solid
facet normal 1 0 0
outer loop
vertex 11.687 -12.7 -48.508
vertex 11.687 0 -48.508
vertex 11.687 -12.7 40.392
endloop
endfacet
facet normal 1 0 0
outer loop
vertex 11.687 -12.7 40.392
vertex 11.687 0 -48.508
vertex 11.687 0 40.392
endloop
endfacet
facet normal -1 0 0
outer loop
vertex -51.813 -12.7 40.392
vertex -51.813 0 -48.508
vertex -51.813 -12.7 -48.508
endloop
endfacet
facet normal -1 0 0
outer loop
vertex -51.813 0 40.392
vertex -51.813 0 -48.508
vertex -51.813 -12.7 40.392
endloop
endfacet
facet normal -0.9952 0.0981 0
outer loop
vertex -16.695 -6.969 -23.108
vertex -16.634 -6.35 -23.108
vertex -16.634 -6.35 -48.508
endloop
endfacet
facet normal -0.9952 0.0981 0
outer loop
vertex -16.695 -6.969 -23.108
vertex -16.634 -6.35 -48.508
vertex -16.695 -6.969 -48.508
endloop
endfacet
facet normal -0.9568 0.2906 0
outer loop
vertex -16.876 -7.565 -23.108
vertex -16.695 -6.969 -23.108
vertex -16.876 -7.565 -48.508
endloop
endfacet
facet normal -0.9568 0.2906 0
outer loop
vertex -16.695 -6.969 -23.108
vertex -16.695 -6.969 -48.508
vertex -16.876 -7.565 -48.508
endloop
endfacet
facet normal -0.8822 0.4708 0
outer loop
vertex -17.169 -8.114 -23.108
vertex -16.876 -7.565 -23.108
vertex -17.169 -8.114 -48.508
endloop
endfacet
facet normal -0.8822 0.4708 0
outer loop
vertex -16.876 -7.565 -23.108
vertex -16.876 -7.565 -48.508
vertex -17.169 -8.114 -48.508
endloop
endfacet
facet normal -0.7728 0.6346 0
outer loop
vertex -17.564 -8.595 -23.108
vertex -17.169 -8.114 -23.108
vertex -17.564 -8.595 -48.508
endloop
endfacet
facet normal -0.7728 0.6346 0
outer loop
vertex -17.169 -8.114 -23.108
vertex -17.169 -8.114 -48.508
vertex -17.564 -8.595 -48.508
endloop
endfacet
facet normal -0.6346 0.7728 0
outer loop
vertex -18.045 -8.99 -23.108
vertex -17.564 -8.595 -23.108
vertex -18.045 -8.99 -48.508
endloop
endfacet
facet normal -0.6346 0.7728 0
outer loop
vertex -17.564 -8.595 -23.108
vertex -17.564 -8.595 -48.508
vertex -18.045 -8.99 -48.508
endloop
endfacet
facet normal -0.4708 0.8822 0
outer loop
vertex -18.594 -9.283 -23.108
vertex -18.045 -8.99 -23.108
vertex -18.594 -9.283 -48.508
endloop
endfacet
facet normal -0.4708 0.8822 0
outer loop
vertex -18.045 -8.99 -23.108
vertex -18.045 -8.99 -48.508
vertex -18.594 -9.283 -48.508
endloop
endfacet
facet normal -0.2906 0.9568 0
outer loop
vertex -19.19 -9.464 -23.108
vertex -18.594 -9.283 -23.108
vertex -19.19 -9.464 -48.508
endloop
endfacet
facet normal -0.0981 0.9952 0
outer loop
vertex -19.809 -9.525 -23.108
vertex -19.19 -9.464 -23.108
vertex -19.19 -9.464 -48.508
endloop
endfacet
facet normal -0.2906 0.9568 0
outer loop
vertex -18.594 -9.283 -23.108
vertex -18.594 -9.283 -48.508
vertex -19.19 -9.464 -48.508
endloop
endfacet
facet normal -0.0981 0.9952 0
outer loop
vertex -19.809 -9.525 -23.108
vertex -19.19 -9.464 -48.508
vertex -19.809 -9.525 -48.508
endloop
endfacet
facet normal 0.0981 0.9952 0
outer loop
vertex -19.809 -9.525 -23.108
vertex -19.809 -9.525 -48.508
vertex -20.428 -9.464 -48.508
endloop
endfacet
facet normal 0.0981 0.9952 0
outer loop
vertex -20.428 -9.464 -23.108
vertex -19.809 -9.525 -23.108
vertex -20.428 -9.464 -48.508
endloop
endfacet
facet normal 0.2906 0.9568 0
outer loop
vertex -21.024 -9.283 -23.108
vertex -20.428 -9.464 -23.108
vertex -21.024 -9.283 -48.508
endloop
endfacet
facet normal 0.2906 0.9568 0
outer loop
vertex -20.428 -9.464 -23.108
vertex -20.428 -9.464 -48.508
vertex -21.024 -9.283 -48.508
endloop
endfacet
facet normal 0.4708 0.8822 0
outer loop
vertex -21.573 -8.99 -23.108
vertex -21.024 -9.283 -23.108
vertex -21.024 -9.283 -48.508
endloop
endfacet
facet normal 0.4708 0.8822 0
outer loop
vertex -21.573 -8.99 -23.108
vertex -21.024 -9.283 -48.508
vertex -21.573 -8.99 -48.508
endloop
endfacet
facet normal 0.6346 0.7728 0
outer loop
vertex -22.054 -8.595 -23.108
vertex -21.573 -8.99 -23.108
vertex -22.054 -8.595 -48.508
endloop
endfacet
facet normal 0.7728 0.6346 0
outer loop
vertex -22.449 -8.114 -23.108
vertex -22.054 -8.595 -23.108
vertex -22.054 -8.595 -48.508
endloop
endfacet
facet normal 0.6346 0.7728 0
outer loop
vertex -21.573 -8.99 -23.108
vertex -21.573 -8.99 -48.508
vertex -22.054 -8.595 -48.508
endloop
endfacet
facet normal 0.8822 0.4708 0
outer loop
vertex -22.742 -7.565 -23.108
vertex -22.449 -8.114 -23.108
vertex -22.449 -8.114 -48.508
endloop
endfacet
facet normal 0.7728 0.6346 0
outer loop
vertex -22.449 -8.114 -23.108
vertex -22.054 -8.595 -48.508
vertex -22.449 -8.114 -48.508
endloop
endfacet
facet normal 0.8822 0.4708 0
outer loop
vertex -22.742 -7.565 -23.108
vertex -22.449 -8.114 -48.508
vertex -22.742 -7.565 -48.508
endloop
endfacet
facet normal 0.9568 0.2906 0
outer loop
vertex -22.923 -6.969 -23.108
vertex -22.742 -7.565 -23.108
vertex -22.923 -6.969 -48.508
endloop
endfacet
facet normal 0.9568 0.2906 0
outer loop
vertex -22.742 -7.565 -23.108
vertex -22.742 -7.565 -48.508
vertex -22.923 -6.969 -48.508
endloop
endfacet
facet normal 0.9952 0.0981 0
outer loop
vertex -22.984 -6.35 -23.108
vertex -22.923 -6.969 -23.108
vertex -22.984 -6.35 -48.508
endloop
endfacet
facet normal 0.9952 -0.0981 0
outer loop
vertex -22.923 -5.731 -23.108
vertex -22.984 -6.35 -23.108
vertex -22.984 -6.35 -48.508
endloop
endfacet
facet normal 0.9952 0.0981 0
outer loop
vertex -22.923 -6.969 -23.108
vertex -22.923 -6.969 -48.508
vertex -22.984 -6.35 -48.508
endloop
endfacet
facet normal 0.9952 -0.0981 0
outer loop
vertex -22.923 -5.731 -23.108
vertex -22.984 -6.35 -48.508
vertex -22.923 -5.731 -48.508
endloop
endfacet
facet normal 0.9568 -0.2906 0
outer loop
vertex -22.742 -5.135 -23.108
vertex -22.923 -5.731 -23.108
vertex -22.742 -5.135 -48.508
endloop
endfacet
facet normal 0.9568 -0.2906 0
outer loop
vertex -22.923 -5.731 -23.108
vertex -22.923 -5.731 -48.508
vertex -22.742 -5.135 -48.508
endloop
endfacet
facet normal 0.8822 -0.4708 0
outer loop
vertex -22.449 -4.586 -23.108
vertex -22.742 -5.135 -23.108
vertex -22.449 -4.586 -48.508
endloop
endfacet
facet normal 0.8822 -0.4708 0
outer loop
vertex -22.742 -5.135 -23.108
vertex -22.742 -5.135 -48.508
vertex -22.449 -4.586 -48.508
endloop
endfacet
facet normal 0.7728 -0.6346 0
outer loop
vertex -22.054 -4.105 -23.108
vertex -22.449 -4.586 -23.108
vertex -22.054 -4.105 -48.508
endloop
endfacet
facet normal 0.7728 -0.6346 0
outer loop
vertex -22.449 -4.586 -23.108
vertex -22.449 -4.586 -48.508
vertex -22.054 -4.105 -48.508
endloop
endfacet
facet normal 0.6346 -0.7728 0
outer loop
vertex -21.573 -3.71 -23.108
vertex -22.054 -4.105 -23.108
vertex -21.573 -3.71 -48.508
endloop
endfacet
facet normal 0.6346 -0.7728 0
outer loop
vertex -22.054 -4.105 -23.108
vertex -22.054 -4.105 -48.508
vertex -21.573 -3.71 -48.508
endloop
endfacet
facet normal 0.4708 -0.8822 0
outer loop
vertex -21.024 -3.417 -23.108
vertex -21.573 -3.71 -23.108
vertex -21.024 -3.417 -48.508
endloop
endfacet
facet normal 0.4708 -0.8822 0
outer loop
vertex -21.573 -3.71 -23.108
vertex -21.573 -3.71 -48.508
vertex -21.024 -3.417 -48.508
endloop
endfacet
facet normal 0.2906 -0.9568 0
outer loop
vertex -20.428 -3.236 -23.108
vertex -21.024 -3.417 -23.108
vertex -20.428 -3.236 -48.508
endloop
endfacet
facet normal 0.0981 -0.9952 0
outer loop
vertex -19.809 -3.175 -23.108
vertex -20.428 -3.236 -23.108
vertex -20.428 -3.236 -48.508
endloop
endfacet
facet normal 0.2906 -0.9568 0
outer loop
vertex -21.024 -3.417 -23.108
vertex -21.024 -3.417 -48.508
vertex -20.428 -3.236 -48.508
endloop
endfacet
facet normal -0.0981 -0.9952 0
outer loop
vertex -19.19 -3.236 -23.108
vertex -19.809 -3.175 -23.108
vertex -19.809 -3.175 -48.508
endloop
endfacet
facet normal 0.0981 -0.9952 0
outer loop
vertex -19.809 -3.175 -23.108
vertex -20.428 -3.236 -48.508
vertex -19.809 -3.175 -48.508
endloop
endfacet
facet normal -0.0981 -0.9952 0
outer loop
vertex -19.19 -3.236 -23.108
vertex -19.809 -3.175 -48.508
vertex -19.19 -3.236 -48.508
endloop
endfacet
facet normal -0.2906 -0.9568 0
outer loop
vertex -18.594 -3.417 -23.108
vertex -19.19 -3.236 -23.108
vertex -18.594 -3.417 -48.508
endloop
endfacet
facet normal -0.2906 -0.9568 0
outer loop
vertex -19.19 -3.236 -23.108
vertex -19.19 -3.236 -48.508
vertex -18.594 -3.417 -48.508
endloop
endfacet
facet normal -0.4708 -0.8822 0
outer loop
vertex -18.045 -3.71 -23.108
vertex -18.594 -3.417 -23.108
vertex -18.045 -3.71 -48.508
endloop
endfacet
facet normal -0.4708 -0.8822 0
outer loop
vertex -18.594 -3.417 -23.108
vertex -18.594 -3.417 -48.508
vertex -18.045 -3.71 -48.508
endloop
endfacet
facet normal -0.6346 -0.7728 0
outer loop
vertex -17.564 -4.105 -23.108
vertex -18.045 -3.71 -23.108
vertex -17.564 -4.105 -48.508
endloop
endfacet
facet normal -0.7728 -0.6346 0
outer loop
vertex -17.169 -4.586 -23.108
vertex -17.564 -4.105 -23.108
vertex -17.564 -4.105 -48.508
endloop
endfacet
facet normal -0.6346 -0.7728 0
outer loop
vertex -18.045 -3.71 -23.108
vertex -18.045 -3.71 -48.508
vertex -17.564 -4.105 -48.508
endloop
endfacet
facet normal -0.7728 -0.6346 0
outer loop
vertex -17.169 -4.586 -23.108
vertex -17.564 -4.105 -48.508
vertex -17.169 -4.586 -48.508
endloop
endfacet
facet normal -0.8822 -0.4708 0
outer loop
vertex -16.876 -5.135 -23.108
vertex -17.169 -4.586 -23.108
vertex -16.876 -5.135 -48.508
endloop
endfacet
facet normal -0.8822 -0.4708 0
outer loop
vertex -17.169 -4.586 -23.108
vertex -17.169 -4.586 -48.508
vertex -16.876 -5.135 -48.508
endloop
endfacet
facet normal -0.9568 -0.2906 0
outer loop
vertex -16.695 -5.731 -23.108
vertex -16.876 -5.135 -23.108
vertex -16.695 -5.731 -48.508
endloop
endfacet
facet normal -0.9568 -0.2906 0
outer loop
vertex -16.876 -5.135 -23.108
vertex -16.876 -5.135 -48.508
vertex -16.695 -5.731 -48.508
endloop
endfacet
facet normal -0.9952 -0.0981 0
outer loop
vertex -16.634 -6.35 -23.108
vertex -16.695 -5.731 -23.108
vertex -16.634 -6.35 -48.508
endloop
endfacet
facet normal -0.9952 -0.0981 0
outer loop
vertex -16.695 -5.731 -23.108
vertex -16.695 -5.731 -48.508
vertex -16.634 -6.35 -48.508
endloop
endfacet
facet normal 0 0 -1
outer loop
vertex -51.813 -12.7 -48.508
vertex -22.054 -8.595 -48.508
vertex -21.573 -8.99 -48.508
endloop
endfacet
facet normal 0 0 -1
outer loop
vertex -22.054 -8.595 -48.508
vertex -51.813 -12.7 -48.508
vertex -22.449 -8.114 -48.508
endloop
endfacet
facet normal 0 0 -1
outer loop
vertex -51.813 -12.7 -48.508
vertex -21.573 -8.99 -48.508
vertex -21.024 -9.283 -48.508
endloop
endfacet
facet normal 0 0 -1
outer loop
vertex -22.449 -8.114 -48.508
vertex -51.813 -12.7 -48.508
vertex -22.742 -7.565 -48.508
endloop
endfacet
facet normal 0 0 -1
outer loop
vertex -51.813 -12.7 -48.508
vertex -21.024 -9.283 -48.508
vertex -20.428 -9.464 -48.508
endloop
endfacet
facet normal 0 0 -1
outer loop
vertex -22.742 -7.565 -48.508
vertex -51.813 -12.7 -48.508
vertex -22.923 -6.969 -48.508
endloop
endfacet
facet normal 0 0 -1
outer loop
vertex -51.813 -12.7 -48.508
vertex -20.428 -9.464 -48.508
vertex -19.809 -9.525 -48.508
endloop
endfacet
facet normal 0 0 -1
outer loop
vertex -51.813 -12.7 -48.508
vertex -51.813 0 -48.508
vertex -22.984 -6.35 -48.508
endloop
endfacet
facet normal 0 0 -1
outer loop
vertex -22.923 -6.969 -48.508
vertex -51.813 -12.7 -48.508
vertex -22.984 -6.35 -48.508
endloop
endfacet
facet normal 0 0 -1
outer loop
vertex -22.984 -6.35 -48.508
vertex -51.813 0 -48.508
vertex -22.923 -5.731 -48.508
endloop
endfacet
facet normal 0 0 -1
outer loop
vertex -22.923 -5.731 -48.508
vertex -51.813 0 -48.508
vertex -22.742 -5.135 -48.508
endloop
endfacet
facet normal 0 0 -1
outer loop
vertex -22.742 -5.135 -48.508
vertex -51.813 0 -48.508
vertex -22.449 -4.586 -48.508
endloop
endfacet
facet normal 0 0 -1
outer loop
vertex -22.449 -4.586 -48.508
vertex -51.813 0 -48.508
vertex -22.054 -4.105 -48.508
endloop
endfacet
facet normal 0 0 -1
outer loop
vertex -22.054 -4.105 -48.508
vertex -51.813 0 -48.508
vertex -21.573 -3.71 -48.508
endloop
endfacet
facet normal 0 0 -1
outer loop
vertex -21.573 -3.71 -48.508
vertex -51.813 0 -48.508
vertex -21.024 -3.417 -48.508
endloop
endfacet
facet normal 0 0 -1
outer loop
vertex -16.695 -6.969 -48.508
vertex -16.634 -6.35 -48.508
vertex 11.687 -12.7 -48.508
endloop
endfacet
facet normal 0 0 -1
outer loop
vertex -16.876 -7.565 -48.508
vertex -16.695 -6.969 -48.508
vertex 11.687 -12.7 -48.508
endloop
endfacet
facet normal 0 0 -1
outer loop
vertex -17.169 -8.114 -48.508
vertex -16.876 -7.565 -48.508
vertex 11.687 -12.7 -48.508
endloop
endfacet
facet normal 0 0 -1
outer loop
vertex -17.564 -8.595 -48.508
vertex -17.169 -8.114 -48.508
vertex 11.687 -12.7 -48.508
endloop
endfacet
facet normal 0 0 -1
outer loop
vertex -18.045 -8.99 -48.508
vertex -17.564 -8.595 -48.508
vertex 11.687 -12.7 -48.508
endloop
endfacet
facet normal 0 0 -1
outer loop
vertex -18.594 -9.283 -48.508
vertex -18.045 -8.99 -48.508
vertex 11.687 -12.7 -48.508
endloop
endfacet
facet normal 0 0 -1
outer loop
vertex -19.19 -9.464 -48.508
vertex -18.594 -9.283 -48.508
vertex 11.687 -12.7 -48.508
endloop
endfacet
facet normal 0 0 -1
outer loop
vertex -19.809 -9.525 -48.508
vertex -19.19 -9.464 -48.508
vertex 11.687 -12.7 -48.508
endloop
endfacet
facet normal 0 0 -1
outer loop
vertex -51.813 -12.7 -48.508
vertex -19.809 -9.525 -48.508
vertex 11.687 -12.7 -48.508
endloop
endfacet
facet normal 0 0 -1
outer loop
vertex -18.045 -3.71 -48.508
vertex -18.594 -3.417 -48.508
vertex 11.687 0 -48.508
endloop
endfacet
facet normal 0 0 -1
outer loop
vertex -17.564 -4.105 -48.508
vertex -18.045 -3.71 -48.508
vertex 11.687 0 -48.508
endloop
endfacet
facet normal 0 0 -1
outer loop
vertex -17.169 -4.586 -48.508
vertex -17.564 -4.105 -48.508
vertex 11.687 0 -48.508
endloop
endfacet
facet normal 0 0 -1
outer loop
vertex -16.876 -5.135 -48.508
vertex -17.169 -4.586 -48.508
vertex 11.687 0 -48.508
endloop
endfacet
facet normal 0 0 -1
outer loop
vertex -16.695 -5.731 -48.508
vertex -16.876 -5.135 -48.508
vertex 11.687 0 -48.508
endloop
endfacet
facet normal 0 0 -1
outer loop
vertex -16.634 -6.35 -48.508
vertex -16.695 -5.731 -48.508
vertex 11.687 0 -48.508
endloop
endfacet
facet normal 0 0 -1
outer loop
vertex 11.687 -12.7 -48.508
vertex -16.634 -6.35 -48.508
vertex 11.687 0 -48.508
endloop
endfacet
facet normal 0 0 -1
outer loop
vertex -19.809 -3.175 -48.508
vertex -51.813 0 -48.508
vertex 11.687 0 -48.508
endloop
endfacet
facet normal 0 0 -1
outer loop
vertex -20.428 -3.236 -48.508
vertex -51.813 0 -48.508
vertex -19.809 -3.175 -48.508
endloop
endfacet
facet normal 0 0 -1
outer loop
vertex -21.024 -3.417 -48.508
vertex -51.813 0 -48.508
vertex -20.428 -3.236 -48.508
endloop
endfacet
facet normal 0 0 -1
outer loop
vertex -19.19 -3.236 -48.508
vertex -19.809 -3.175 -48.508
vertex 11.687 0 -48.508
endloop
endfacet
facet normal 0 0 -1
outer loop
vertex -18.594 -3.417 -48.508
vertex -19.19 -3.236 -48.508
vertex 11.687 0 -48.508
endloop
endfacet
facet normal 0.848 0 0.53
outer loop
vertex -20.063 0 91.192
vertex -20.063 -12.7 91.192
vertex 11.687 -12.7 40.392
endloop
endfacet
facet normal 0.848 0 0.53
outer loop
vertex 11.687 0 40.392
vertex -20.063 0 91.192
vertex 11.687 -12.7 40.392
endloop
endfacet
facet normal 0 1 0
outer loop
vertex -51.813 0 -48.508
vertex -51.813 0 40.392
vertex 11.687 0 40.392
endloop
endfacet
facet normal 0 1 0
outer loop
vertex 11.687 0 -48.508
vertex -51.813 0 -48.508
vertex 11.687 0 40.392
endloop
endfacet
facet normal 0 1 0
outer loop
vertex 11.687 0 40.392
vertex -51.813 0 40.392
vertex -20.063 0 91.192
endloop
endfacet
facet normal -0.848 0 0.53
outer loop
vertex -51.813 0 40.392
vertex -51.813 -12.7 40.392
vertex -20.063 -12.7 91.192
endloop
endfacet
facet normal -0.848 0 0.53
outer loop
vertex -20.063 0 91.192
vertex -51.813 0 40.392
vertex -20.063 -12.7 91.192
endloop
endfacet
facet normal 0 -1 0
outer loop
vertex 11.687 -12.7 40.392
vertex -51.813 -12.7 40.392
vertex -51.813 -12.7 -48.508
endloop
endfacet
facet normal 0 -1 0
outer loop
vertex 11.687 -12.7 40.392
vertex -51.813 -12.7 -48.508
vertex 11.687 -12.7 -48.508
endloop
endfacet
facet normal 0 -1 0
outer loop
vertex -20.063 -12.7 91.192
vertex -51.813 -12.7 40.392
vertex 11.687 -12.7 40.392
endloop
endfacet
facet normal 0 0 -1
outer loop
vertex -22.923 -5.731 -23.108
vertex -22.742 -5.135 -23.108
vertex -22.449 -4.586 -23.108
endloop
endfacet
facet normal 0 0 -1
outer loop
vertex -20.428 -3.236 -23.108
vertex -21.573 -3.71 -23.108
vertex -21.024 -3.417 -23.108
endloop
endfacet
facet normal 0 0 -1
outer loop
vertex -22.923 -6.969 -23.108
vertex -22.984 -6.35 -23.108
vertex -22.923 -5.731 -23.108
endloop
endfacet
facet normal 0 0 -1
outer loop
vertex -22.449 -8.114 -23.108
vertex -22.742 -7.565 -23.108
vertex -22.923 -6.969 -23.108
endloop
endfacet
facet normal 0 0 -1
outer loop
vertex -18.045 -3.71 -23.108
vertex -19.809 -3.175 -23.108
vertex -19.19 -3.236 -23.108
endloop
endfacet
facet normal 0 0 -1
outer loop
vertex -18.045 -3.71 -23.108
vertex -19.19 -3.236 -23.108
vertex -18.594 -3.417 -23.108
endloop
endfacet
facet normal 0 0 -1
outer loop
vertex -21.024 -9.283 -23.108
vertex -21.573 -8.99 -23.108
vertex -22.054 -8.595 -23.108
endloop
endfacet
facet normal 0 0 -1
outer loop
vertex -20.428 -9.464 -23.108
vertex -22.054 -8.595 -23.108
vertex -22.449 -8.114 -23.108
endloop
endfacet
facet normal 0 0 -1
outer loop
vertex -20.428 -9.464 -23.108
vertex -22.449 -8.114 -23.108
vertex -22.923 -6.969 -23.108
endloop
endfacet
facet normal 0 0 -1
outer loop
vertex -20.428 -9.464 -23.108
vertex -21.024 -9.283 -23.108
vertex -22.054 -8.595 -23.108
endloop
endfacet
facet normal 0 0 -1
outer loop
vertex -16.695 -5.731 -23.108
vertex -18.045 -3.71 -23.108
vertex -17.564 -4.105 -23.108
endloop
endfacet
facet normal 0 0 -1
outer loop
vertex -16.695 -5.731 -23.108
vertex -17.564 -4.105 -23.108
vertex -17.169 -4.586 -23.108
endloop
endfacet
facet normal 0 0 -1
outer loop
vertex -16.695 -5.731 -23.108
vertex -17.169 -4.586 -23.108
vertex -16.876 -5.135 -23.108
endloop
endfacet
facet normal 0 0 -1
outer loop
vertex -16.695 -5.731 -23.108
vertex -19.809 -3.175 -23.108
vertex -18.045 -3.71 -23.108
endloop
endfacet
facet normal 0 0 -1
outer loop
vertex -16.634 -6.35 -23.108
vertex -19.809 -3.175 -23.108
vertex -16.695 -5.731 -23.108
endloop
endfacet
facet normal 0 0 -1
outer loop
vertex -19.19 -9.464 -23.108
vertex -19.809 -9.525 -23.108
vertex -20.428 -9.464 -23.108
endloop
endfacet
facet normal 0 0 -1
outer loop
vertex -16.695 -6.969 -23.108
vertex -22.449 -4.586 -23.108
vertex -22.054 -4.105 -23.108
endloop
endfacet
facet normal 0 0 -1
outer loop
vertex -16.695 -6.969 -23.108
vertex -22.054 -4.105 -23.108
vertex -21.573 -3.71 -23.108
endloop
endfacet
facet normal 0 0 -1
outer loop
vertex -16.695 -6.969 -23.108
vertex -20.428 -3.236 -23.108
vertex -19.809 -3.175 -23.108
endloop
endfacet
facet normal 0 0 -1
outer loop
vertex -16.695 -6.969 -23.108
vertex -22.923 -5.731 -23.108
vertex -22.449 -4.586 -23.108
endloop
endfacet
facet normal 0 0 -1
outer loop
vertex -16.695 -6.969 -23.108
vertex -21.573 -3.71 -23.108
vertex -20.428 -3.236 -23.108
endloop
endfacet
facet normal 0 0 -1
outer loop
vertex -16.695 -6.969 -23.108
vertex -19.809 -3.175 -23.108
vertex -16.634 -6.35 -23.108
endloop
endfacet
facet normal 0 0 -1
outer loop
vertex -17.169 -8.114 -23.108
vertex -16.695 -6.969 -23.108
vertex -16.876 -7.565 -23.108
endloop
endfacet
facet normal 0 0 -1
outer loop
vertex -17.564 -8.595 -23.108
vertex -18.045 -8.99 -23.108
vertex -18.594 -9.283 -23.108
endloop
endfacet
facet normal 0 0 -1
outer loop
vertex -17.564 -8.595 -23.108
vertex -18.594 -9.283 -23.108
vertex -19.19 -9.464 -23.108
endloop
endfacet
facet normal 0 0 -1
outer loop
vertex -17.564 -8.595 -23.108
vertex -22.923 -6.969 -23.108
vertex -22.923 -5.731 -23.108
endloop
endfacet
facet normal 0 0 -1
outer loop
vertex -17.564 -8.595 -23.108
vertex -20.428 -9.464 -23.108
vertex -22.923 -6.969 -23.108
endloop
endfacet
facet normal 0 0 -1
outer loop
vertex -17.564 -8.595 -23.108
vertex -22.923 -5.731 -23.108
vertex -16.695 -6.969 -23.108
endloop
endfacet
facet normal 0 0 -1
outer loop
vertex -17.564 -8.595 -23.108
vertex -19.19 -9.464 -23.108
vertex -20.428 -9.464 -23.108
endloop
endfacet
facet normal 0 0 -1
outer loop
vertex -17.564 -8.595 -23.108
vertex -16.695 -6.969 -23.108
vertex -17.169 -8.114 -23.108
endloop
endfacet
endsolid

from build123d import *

# Parameters (mm, degrees)
F0_W     = 63.5
F0_H     = 139.7
F1_DEPTH = 12.7
F3_DEPTH = 25.4
F4_R     = 3.175
F5_DEPTH = 25.4


with BuildPart() as f1:
    # F0 (on Front) → F1 (new body)
    with BuildSketch(Plane.XZ):
        with Locations((-20.063438, 21.341896)):
            Rectangle(F0_W, F0_H)
    extrude(amount=F1_DEPTH)

    # F2 (on face) → F3 (cut)
    with BuildSketch(Plane.XZ.offset(12.7)):
        Polygon((-51.813438, 40.391896), (-20.063438, 91.191896), (-51.813438, 91.191896), align=None)
        Polygon((11.686562, 91.191896), (-20.063438, 91.191896), (11.686562, 40.391896), align=None)
    extrude(amount=-F3_DEPTH, mode=Mode.SUBTRACT)

    # F4 (on face) → F5 (cut)
    with BuildSketch(Plane(origin=(0, 0, -48.508104), x_dir=(1, 0, 0), z_dir=(0, 0, -1))):
        with Locations((-19.809052, 6.35)):
            Circle(F4_R)
    extrude(amount=-F5_DEPTH, mode=Mode.SUBTRACT)


solid = f1.part
